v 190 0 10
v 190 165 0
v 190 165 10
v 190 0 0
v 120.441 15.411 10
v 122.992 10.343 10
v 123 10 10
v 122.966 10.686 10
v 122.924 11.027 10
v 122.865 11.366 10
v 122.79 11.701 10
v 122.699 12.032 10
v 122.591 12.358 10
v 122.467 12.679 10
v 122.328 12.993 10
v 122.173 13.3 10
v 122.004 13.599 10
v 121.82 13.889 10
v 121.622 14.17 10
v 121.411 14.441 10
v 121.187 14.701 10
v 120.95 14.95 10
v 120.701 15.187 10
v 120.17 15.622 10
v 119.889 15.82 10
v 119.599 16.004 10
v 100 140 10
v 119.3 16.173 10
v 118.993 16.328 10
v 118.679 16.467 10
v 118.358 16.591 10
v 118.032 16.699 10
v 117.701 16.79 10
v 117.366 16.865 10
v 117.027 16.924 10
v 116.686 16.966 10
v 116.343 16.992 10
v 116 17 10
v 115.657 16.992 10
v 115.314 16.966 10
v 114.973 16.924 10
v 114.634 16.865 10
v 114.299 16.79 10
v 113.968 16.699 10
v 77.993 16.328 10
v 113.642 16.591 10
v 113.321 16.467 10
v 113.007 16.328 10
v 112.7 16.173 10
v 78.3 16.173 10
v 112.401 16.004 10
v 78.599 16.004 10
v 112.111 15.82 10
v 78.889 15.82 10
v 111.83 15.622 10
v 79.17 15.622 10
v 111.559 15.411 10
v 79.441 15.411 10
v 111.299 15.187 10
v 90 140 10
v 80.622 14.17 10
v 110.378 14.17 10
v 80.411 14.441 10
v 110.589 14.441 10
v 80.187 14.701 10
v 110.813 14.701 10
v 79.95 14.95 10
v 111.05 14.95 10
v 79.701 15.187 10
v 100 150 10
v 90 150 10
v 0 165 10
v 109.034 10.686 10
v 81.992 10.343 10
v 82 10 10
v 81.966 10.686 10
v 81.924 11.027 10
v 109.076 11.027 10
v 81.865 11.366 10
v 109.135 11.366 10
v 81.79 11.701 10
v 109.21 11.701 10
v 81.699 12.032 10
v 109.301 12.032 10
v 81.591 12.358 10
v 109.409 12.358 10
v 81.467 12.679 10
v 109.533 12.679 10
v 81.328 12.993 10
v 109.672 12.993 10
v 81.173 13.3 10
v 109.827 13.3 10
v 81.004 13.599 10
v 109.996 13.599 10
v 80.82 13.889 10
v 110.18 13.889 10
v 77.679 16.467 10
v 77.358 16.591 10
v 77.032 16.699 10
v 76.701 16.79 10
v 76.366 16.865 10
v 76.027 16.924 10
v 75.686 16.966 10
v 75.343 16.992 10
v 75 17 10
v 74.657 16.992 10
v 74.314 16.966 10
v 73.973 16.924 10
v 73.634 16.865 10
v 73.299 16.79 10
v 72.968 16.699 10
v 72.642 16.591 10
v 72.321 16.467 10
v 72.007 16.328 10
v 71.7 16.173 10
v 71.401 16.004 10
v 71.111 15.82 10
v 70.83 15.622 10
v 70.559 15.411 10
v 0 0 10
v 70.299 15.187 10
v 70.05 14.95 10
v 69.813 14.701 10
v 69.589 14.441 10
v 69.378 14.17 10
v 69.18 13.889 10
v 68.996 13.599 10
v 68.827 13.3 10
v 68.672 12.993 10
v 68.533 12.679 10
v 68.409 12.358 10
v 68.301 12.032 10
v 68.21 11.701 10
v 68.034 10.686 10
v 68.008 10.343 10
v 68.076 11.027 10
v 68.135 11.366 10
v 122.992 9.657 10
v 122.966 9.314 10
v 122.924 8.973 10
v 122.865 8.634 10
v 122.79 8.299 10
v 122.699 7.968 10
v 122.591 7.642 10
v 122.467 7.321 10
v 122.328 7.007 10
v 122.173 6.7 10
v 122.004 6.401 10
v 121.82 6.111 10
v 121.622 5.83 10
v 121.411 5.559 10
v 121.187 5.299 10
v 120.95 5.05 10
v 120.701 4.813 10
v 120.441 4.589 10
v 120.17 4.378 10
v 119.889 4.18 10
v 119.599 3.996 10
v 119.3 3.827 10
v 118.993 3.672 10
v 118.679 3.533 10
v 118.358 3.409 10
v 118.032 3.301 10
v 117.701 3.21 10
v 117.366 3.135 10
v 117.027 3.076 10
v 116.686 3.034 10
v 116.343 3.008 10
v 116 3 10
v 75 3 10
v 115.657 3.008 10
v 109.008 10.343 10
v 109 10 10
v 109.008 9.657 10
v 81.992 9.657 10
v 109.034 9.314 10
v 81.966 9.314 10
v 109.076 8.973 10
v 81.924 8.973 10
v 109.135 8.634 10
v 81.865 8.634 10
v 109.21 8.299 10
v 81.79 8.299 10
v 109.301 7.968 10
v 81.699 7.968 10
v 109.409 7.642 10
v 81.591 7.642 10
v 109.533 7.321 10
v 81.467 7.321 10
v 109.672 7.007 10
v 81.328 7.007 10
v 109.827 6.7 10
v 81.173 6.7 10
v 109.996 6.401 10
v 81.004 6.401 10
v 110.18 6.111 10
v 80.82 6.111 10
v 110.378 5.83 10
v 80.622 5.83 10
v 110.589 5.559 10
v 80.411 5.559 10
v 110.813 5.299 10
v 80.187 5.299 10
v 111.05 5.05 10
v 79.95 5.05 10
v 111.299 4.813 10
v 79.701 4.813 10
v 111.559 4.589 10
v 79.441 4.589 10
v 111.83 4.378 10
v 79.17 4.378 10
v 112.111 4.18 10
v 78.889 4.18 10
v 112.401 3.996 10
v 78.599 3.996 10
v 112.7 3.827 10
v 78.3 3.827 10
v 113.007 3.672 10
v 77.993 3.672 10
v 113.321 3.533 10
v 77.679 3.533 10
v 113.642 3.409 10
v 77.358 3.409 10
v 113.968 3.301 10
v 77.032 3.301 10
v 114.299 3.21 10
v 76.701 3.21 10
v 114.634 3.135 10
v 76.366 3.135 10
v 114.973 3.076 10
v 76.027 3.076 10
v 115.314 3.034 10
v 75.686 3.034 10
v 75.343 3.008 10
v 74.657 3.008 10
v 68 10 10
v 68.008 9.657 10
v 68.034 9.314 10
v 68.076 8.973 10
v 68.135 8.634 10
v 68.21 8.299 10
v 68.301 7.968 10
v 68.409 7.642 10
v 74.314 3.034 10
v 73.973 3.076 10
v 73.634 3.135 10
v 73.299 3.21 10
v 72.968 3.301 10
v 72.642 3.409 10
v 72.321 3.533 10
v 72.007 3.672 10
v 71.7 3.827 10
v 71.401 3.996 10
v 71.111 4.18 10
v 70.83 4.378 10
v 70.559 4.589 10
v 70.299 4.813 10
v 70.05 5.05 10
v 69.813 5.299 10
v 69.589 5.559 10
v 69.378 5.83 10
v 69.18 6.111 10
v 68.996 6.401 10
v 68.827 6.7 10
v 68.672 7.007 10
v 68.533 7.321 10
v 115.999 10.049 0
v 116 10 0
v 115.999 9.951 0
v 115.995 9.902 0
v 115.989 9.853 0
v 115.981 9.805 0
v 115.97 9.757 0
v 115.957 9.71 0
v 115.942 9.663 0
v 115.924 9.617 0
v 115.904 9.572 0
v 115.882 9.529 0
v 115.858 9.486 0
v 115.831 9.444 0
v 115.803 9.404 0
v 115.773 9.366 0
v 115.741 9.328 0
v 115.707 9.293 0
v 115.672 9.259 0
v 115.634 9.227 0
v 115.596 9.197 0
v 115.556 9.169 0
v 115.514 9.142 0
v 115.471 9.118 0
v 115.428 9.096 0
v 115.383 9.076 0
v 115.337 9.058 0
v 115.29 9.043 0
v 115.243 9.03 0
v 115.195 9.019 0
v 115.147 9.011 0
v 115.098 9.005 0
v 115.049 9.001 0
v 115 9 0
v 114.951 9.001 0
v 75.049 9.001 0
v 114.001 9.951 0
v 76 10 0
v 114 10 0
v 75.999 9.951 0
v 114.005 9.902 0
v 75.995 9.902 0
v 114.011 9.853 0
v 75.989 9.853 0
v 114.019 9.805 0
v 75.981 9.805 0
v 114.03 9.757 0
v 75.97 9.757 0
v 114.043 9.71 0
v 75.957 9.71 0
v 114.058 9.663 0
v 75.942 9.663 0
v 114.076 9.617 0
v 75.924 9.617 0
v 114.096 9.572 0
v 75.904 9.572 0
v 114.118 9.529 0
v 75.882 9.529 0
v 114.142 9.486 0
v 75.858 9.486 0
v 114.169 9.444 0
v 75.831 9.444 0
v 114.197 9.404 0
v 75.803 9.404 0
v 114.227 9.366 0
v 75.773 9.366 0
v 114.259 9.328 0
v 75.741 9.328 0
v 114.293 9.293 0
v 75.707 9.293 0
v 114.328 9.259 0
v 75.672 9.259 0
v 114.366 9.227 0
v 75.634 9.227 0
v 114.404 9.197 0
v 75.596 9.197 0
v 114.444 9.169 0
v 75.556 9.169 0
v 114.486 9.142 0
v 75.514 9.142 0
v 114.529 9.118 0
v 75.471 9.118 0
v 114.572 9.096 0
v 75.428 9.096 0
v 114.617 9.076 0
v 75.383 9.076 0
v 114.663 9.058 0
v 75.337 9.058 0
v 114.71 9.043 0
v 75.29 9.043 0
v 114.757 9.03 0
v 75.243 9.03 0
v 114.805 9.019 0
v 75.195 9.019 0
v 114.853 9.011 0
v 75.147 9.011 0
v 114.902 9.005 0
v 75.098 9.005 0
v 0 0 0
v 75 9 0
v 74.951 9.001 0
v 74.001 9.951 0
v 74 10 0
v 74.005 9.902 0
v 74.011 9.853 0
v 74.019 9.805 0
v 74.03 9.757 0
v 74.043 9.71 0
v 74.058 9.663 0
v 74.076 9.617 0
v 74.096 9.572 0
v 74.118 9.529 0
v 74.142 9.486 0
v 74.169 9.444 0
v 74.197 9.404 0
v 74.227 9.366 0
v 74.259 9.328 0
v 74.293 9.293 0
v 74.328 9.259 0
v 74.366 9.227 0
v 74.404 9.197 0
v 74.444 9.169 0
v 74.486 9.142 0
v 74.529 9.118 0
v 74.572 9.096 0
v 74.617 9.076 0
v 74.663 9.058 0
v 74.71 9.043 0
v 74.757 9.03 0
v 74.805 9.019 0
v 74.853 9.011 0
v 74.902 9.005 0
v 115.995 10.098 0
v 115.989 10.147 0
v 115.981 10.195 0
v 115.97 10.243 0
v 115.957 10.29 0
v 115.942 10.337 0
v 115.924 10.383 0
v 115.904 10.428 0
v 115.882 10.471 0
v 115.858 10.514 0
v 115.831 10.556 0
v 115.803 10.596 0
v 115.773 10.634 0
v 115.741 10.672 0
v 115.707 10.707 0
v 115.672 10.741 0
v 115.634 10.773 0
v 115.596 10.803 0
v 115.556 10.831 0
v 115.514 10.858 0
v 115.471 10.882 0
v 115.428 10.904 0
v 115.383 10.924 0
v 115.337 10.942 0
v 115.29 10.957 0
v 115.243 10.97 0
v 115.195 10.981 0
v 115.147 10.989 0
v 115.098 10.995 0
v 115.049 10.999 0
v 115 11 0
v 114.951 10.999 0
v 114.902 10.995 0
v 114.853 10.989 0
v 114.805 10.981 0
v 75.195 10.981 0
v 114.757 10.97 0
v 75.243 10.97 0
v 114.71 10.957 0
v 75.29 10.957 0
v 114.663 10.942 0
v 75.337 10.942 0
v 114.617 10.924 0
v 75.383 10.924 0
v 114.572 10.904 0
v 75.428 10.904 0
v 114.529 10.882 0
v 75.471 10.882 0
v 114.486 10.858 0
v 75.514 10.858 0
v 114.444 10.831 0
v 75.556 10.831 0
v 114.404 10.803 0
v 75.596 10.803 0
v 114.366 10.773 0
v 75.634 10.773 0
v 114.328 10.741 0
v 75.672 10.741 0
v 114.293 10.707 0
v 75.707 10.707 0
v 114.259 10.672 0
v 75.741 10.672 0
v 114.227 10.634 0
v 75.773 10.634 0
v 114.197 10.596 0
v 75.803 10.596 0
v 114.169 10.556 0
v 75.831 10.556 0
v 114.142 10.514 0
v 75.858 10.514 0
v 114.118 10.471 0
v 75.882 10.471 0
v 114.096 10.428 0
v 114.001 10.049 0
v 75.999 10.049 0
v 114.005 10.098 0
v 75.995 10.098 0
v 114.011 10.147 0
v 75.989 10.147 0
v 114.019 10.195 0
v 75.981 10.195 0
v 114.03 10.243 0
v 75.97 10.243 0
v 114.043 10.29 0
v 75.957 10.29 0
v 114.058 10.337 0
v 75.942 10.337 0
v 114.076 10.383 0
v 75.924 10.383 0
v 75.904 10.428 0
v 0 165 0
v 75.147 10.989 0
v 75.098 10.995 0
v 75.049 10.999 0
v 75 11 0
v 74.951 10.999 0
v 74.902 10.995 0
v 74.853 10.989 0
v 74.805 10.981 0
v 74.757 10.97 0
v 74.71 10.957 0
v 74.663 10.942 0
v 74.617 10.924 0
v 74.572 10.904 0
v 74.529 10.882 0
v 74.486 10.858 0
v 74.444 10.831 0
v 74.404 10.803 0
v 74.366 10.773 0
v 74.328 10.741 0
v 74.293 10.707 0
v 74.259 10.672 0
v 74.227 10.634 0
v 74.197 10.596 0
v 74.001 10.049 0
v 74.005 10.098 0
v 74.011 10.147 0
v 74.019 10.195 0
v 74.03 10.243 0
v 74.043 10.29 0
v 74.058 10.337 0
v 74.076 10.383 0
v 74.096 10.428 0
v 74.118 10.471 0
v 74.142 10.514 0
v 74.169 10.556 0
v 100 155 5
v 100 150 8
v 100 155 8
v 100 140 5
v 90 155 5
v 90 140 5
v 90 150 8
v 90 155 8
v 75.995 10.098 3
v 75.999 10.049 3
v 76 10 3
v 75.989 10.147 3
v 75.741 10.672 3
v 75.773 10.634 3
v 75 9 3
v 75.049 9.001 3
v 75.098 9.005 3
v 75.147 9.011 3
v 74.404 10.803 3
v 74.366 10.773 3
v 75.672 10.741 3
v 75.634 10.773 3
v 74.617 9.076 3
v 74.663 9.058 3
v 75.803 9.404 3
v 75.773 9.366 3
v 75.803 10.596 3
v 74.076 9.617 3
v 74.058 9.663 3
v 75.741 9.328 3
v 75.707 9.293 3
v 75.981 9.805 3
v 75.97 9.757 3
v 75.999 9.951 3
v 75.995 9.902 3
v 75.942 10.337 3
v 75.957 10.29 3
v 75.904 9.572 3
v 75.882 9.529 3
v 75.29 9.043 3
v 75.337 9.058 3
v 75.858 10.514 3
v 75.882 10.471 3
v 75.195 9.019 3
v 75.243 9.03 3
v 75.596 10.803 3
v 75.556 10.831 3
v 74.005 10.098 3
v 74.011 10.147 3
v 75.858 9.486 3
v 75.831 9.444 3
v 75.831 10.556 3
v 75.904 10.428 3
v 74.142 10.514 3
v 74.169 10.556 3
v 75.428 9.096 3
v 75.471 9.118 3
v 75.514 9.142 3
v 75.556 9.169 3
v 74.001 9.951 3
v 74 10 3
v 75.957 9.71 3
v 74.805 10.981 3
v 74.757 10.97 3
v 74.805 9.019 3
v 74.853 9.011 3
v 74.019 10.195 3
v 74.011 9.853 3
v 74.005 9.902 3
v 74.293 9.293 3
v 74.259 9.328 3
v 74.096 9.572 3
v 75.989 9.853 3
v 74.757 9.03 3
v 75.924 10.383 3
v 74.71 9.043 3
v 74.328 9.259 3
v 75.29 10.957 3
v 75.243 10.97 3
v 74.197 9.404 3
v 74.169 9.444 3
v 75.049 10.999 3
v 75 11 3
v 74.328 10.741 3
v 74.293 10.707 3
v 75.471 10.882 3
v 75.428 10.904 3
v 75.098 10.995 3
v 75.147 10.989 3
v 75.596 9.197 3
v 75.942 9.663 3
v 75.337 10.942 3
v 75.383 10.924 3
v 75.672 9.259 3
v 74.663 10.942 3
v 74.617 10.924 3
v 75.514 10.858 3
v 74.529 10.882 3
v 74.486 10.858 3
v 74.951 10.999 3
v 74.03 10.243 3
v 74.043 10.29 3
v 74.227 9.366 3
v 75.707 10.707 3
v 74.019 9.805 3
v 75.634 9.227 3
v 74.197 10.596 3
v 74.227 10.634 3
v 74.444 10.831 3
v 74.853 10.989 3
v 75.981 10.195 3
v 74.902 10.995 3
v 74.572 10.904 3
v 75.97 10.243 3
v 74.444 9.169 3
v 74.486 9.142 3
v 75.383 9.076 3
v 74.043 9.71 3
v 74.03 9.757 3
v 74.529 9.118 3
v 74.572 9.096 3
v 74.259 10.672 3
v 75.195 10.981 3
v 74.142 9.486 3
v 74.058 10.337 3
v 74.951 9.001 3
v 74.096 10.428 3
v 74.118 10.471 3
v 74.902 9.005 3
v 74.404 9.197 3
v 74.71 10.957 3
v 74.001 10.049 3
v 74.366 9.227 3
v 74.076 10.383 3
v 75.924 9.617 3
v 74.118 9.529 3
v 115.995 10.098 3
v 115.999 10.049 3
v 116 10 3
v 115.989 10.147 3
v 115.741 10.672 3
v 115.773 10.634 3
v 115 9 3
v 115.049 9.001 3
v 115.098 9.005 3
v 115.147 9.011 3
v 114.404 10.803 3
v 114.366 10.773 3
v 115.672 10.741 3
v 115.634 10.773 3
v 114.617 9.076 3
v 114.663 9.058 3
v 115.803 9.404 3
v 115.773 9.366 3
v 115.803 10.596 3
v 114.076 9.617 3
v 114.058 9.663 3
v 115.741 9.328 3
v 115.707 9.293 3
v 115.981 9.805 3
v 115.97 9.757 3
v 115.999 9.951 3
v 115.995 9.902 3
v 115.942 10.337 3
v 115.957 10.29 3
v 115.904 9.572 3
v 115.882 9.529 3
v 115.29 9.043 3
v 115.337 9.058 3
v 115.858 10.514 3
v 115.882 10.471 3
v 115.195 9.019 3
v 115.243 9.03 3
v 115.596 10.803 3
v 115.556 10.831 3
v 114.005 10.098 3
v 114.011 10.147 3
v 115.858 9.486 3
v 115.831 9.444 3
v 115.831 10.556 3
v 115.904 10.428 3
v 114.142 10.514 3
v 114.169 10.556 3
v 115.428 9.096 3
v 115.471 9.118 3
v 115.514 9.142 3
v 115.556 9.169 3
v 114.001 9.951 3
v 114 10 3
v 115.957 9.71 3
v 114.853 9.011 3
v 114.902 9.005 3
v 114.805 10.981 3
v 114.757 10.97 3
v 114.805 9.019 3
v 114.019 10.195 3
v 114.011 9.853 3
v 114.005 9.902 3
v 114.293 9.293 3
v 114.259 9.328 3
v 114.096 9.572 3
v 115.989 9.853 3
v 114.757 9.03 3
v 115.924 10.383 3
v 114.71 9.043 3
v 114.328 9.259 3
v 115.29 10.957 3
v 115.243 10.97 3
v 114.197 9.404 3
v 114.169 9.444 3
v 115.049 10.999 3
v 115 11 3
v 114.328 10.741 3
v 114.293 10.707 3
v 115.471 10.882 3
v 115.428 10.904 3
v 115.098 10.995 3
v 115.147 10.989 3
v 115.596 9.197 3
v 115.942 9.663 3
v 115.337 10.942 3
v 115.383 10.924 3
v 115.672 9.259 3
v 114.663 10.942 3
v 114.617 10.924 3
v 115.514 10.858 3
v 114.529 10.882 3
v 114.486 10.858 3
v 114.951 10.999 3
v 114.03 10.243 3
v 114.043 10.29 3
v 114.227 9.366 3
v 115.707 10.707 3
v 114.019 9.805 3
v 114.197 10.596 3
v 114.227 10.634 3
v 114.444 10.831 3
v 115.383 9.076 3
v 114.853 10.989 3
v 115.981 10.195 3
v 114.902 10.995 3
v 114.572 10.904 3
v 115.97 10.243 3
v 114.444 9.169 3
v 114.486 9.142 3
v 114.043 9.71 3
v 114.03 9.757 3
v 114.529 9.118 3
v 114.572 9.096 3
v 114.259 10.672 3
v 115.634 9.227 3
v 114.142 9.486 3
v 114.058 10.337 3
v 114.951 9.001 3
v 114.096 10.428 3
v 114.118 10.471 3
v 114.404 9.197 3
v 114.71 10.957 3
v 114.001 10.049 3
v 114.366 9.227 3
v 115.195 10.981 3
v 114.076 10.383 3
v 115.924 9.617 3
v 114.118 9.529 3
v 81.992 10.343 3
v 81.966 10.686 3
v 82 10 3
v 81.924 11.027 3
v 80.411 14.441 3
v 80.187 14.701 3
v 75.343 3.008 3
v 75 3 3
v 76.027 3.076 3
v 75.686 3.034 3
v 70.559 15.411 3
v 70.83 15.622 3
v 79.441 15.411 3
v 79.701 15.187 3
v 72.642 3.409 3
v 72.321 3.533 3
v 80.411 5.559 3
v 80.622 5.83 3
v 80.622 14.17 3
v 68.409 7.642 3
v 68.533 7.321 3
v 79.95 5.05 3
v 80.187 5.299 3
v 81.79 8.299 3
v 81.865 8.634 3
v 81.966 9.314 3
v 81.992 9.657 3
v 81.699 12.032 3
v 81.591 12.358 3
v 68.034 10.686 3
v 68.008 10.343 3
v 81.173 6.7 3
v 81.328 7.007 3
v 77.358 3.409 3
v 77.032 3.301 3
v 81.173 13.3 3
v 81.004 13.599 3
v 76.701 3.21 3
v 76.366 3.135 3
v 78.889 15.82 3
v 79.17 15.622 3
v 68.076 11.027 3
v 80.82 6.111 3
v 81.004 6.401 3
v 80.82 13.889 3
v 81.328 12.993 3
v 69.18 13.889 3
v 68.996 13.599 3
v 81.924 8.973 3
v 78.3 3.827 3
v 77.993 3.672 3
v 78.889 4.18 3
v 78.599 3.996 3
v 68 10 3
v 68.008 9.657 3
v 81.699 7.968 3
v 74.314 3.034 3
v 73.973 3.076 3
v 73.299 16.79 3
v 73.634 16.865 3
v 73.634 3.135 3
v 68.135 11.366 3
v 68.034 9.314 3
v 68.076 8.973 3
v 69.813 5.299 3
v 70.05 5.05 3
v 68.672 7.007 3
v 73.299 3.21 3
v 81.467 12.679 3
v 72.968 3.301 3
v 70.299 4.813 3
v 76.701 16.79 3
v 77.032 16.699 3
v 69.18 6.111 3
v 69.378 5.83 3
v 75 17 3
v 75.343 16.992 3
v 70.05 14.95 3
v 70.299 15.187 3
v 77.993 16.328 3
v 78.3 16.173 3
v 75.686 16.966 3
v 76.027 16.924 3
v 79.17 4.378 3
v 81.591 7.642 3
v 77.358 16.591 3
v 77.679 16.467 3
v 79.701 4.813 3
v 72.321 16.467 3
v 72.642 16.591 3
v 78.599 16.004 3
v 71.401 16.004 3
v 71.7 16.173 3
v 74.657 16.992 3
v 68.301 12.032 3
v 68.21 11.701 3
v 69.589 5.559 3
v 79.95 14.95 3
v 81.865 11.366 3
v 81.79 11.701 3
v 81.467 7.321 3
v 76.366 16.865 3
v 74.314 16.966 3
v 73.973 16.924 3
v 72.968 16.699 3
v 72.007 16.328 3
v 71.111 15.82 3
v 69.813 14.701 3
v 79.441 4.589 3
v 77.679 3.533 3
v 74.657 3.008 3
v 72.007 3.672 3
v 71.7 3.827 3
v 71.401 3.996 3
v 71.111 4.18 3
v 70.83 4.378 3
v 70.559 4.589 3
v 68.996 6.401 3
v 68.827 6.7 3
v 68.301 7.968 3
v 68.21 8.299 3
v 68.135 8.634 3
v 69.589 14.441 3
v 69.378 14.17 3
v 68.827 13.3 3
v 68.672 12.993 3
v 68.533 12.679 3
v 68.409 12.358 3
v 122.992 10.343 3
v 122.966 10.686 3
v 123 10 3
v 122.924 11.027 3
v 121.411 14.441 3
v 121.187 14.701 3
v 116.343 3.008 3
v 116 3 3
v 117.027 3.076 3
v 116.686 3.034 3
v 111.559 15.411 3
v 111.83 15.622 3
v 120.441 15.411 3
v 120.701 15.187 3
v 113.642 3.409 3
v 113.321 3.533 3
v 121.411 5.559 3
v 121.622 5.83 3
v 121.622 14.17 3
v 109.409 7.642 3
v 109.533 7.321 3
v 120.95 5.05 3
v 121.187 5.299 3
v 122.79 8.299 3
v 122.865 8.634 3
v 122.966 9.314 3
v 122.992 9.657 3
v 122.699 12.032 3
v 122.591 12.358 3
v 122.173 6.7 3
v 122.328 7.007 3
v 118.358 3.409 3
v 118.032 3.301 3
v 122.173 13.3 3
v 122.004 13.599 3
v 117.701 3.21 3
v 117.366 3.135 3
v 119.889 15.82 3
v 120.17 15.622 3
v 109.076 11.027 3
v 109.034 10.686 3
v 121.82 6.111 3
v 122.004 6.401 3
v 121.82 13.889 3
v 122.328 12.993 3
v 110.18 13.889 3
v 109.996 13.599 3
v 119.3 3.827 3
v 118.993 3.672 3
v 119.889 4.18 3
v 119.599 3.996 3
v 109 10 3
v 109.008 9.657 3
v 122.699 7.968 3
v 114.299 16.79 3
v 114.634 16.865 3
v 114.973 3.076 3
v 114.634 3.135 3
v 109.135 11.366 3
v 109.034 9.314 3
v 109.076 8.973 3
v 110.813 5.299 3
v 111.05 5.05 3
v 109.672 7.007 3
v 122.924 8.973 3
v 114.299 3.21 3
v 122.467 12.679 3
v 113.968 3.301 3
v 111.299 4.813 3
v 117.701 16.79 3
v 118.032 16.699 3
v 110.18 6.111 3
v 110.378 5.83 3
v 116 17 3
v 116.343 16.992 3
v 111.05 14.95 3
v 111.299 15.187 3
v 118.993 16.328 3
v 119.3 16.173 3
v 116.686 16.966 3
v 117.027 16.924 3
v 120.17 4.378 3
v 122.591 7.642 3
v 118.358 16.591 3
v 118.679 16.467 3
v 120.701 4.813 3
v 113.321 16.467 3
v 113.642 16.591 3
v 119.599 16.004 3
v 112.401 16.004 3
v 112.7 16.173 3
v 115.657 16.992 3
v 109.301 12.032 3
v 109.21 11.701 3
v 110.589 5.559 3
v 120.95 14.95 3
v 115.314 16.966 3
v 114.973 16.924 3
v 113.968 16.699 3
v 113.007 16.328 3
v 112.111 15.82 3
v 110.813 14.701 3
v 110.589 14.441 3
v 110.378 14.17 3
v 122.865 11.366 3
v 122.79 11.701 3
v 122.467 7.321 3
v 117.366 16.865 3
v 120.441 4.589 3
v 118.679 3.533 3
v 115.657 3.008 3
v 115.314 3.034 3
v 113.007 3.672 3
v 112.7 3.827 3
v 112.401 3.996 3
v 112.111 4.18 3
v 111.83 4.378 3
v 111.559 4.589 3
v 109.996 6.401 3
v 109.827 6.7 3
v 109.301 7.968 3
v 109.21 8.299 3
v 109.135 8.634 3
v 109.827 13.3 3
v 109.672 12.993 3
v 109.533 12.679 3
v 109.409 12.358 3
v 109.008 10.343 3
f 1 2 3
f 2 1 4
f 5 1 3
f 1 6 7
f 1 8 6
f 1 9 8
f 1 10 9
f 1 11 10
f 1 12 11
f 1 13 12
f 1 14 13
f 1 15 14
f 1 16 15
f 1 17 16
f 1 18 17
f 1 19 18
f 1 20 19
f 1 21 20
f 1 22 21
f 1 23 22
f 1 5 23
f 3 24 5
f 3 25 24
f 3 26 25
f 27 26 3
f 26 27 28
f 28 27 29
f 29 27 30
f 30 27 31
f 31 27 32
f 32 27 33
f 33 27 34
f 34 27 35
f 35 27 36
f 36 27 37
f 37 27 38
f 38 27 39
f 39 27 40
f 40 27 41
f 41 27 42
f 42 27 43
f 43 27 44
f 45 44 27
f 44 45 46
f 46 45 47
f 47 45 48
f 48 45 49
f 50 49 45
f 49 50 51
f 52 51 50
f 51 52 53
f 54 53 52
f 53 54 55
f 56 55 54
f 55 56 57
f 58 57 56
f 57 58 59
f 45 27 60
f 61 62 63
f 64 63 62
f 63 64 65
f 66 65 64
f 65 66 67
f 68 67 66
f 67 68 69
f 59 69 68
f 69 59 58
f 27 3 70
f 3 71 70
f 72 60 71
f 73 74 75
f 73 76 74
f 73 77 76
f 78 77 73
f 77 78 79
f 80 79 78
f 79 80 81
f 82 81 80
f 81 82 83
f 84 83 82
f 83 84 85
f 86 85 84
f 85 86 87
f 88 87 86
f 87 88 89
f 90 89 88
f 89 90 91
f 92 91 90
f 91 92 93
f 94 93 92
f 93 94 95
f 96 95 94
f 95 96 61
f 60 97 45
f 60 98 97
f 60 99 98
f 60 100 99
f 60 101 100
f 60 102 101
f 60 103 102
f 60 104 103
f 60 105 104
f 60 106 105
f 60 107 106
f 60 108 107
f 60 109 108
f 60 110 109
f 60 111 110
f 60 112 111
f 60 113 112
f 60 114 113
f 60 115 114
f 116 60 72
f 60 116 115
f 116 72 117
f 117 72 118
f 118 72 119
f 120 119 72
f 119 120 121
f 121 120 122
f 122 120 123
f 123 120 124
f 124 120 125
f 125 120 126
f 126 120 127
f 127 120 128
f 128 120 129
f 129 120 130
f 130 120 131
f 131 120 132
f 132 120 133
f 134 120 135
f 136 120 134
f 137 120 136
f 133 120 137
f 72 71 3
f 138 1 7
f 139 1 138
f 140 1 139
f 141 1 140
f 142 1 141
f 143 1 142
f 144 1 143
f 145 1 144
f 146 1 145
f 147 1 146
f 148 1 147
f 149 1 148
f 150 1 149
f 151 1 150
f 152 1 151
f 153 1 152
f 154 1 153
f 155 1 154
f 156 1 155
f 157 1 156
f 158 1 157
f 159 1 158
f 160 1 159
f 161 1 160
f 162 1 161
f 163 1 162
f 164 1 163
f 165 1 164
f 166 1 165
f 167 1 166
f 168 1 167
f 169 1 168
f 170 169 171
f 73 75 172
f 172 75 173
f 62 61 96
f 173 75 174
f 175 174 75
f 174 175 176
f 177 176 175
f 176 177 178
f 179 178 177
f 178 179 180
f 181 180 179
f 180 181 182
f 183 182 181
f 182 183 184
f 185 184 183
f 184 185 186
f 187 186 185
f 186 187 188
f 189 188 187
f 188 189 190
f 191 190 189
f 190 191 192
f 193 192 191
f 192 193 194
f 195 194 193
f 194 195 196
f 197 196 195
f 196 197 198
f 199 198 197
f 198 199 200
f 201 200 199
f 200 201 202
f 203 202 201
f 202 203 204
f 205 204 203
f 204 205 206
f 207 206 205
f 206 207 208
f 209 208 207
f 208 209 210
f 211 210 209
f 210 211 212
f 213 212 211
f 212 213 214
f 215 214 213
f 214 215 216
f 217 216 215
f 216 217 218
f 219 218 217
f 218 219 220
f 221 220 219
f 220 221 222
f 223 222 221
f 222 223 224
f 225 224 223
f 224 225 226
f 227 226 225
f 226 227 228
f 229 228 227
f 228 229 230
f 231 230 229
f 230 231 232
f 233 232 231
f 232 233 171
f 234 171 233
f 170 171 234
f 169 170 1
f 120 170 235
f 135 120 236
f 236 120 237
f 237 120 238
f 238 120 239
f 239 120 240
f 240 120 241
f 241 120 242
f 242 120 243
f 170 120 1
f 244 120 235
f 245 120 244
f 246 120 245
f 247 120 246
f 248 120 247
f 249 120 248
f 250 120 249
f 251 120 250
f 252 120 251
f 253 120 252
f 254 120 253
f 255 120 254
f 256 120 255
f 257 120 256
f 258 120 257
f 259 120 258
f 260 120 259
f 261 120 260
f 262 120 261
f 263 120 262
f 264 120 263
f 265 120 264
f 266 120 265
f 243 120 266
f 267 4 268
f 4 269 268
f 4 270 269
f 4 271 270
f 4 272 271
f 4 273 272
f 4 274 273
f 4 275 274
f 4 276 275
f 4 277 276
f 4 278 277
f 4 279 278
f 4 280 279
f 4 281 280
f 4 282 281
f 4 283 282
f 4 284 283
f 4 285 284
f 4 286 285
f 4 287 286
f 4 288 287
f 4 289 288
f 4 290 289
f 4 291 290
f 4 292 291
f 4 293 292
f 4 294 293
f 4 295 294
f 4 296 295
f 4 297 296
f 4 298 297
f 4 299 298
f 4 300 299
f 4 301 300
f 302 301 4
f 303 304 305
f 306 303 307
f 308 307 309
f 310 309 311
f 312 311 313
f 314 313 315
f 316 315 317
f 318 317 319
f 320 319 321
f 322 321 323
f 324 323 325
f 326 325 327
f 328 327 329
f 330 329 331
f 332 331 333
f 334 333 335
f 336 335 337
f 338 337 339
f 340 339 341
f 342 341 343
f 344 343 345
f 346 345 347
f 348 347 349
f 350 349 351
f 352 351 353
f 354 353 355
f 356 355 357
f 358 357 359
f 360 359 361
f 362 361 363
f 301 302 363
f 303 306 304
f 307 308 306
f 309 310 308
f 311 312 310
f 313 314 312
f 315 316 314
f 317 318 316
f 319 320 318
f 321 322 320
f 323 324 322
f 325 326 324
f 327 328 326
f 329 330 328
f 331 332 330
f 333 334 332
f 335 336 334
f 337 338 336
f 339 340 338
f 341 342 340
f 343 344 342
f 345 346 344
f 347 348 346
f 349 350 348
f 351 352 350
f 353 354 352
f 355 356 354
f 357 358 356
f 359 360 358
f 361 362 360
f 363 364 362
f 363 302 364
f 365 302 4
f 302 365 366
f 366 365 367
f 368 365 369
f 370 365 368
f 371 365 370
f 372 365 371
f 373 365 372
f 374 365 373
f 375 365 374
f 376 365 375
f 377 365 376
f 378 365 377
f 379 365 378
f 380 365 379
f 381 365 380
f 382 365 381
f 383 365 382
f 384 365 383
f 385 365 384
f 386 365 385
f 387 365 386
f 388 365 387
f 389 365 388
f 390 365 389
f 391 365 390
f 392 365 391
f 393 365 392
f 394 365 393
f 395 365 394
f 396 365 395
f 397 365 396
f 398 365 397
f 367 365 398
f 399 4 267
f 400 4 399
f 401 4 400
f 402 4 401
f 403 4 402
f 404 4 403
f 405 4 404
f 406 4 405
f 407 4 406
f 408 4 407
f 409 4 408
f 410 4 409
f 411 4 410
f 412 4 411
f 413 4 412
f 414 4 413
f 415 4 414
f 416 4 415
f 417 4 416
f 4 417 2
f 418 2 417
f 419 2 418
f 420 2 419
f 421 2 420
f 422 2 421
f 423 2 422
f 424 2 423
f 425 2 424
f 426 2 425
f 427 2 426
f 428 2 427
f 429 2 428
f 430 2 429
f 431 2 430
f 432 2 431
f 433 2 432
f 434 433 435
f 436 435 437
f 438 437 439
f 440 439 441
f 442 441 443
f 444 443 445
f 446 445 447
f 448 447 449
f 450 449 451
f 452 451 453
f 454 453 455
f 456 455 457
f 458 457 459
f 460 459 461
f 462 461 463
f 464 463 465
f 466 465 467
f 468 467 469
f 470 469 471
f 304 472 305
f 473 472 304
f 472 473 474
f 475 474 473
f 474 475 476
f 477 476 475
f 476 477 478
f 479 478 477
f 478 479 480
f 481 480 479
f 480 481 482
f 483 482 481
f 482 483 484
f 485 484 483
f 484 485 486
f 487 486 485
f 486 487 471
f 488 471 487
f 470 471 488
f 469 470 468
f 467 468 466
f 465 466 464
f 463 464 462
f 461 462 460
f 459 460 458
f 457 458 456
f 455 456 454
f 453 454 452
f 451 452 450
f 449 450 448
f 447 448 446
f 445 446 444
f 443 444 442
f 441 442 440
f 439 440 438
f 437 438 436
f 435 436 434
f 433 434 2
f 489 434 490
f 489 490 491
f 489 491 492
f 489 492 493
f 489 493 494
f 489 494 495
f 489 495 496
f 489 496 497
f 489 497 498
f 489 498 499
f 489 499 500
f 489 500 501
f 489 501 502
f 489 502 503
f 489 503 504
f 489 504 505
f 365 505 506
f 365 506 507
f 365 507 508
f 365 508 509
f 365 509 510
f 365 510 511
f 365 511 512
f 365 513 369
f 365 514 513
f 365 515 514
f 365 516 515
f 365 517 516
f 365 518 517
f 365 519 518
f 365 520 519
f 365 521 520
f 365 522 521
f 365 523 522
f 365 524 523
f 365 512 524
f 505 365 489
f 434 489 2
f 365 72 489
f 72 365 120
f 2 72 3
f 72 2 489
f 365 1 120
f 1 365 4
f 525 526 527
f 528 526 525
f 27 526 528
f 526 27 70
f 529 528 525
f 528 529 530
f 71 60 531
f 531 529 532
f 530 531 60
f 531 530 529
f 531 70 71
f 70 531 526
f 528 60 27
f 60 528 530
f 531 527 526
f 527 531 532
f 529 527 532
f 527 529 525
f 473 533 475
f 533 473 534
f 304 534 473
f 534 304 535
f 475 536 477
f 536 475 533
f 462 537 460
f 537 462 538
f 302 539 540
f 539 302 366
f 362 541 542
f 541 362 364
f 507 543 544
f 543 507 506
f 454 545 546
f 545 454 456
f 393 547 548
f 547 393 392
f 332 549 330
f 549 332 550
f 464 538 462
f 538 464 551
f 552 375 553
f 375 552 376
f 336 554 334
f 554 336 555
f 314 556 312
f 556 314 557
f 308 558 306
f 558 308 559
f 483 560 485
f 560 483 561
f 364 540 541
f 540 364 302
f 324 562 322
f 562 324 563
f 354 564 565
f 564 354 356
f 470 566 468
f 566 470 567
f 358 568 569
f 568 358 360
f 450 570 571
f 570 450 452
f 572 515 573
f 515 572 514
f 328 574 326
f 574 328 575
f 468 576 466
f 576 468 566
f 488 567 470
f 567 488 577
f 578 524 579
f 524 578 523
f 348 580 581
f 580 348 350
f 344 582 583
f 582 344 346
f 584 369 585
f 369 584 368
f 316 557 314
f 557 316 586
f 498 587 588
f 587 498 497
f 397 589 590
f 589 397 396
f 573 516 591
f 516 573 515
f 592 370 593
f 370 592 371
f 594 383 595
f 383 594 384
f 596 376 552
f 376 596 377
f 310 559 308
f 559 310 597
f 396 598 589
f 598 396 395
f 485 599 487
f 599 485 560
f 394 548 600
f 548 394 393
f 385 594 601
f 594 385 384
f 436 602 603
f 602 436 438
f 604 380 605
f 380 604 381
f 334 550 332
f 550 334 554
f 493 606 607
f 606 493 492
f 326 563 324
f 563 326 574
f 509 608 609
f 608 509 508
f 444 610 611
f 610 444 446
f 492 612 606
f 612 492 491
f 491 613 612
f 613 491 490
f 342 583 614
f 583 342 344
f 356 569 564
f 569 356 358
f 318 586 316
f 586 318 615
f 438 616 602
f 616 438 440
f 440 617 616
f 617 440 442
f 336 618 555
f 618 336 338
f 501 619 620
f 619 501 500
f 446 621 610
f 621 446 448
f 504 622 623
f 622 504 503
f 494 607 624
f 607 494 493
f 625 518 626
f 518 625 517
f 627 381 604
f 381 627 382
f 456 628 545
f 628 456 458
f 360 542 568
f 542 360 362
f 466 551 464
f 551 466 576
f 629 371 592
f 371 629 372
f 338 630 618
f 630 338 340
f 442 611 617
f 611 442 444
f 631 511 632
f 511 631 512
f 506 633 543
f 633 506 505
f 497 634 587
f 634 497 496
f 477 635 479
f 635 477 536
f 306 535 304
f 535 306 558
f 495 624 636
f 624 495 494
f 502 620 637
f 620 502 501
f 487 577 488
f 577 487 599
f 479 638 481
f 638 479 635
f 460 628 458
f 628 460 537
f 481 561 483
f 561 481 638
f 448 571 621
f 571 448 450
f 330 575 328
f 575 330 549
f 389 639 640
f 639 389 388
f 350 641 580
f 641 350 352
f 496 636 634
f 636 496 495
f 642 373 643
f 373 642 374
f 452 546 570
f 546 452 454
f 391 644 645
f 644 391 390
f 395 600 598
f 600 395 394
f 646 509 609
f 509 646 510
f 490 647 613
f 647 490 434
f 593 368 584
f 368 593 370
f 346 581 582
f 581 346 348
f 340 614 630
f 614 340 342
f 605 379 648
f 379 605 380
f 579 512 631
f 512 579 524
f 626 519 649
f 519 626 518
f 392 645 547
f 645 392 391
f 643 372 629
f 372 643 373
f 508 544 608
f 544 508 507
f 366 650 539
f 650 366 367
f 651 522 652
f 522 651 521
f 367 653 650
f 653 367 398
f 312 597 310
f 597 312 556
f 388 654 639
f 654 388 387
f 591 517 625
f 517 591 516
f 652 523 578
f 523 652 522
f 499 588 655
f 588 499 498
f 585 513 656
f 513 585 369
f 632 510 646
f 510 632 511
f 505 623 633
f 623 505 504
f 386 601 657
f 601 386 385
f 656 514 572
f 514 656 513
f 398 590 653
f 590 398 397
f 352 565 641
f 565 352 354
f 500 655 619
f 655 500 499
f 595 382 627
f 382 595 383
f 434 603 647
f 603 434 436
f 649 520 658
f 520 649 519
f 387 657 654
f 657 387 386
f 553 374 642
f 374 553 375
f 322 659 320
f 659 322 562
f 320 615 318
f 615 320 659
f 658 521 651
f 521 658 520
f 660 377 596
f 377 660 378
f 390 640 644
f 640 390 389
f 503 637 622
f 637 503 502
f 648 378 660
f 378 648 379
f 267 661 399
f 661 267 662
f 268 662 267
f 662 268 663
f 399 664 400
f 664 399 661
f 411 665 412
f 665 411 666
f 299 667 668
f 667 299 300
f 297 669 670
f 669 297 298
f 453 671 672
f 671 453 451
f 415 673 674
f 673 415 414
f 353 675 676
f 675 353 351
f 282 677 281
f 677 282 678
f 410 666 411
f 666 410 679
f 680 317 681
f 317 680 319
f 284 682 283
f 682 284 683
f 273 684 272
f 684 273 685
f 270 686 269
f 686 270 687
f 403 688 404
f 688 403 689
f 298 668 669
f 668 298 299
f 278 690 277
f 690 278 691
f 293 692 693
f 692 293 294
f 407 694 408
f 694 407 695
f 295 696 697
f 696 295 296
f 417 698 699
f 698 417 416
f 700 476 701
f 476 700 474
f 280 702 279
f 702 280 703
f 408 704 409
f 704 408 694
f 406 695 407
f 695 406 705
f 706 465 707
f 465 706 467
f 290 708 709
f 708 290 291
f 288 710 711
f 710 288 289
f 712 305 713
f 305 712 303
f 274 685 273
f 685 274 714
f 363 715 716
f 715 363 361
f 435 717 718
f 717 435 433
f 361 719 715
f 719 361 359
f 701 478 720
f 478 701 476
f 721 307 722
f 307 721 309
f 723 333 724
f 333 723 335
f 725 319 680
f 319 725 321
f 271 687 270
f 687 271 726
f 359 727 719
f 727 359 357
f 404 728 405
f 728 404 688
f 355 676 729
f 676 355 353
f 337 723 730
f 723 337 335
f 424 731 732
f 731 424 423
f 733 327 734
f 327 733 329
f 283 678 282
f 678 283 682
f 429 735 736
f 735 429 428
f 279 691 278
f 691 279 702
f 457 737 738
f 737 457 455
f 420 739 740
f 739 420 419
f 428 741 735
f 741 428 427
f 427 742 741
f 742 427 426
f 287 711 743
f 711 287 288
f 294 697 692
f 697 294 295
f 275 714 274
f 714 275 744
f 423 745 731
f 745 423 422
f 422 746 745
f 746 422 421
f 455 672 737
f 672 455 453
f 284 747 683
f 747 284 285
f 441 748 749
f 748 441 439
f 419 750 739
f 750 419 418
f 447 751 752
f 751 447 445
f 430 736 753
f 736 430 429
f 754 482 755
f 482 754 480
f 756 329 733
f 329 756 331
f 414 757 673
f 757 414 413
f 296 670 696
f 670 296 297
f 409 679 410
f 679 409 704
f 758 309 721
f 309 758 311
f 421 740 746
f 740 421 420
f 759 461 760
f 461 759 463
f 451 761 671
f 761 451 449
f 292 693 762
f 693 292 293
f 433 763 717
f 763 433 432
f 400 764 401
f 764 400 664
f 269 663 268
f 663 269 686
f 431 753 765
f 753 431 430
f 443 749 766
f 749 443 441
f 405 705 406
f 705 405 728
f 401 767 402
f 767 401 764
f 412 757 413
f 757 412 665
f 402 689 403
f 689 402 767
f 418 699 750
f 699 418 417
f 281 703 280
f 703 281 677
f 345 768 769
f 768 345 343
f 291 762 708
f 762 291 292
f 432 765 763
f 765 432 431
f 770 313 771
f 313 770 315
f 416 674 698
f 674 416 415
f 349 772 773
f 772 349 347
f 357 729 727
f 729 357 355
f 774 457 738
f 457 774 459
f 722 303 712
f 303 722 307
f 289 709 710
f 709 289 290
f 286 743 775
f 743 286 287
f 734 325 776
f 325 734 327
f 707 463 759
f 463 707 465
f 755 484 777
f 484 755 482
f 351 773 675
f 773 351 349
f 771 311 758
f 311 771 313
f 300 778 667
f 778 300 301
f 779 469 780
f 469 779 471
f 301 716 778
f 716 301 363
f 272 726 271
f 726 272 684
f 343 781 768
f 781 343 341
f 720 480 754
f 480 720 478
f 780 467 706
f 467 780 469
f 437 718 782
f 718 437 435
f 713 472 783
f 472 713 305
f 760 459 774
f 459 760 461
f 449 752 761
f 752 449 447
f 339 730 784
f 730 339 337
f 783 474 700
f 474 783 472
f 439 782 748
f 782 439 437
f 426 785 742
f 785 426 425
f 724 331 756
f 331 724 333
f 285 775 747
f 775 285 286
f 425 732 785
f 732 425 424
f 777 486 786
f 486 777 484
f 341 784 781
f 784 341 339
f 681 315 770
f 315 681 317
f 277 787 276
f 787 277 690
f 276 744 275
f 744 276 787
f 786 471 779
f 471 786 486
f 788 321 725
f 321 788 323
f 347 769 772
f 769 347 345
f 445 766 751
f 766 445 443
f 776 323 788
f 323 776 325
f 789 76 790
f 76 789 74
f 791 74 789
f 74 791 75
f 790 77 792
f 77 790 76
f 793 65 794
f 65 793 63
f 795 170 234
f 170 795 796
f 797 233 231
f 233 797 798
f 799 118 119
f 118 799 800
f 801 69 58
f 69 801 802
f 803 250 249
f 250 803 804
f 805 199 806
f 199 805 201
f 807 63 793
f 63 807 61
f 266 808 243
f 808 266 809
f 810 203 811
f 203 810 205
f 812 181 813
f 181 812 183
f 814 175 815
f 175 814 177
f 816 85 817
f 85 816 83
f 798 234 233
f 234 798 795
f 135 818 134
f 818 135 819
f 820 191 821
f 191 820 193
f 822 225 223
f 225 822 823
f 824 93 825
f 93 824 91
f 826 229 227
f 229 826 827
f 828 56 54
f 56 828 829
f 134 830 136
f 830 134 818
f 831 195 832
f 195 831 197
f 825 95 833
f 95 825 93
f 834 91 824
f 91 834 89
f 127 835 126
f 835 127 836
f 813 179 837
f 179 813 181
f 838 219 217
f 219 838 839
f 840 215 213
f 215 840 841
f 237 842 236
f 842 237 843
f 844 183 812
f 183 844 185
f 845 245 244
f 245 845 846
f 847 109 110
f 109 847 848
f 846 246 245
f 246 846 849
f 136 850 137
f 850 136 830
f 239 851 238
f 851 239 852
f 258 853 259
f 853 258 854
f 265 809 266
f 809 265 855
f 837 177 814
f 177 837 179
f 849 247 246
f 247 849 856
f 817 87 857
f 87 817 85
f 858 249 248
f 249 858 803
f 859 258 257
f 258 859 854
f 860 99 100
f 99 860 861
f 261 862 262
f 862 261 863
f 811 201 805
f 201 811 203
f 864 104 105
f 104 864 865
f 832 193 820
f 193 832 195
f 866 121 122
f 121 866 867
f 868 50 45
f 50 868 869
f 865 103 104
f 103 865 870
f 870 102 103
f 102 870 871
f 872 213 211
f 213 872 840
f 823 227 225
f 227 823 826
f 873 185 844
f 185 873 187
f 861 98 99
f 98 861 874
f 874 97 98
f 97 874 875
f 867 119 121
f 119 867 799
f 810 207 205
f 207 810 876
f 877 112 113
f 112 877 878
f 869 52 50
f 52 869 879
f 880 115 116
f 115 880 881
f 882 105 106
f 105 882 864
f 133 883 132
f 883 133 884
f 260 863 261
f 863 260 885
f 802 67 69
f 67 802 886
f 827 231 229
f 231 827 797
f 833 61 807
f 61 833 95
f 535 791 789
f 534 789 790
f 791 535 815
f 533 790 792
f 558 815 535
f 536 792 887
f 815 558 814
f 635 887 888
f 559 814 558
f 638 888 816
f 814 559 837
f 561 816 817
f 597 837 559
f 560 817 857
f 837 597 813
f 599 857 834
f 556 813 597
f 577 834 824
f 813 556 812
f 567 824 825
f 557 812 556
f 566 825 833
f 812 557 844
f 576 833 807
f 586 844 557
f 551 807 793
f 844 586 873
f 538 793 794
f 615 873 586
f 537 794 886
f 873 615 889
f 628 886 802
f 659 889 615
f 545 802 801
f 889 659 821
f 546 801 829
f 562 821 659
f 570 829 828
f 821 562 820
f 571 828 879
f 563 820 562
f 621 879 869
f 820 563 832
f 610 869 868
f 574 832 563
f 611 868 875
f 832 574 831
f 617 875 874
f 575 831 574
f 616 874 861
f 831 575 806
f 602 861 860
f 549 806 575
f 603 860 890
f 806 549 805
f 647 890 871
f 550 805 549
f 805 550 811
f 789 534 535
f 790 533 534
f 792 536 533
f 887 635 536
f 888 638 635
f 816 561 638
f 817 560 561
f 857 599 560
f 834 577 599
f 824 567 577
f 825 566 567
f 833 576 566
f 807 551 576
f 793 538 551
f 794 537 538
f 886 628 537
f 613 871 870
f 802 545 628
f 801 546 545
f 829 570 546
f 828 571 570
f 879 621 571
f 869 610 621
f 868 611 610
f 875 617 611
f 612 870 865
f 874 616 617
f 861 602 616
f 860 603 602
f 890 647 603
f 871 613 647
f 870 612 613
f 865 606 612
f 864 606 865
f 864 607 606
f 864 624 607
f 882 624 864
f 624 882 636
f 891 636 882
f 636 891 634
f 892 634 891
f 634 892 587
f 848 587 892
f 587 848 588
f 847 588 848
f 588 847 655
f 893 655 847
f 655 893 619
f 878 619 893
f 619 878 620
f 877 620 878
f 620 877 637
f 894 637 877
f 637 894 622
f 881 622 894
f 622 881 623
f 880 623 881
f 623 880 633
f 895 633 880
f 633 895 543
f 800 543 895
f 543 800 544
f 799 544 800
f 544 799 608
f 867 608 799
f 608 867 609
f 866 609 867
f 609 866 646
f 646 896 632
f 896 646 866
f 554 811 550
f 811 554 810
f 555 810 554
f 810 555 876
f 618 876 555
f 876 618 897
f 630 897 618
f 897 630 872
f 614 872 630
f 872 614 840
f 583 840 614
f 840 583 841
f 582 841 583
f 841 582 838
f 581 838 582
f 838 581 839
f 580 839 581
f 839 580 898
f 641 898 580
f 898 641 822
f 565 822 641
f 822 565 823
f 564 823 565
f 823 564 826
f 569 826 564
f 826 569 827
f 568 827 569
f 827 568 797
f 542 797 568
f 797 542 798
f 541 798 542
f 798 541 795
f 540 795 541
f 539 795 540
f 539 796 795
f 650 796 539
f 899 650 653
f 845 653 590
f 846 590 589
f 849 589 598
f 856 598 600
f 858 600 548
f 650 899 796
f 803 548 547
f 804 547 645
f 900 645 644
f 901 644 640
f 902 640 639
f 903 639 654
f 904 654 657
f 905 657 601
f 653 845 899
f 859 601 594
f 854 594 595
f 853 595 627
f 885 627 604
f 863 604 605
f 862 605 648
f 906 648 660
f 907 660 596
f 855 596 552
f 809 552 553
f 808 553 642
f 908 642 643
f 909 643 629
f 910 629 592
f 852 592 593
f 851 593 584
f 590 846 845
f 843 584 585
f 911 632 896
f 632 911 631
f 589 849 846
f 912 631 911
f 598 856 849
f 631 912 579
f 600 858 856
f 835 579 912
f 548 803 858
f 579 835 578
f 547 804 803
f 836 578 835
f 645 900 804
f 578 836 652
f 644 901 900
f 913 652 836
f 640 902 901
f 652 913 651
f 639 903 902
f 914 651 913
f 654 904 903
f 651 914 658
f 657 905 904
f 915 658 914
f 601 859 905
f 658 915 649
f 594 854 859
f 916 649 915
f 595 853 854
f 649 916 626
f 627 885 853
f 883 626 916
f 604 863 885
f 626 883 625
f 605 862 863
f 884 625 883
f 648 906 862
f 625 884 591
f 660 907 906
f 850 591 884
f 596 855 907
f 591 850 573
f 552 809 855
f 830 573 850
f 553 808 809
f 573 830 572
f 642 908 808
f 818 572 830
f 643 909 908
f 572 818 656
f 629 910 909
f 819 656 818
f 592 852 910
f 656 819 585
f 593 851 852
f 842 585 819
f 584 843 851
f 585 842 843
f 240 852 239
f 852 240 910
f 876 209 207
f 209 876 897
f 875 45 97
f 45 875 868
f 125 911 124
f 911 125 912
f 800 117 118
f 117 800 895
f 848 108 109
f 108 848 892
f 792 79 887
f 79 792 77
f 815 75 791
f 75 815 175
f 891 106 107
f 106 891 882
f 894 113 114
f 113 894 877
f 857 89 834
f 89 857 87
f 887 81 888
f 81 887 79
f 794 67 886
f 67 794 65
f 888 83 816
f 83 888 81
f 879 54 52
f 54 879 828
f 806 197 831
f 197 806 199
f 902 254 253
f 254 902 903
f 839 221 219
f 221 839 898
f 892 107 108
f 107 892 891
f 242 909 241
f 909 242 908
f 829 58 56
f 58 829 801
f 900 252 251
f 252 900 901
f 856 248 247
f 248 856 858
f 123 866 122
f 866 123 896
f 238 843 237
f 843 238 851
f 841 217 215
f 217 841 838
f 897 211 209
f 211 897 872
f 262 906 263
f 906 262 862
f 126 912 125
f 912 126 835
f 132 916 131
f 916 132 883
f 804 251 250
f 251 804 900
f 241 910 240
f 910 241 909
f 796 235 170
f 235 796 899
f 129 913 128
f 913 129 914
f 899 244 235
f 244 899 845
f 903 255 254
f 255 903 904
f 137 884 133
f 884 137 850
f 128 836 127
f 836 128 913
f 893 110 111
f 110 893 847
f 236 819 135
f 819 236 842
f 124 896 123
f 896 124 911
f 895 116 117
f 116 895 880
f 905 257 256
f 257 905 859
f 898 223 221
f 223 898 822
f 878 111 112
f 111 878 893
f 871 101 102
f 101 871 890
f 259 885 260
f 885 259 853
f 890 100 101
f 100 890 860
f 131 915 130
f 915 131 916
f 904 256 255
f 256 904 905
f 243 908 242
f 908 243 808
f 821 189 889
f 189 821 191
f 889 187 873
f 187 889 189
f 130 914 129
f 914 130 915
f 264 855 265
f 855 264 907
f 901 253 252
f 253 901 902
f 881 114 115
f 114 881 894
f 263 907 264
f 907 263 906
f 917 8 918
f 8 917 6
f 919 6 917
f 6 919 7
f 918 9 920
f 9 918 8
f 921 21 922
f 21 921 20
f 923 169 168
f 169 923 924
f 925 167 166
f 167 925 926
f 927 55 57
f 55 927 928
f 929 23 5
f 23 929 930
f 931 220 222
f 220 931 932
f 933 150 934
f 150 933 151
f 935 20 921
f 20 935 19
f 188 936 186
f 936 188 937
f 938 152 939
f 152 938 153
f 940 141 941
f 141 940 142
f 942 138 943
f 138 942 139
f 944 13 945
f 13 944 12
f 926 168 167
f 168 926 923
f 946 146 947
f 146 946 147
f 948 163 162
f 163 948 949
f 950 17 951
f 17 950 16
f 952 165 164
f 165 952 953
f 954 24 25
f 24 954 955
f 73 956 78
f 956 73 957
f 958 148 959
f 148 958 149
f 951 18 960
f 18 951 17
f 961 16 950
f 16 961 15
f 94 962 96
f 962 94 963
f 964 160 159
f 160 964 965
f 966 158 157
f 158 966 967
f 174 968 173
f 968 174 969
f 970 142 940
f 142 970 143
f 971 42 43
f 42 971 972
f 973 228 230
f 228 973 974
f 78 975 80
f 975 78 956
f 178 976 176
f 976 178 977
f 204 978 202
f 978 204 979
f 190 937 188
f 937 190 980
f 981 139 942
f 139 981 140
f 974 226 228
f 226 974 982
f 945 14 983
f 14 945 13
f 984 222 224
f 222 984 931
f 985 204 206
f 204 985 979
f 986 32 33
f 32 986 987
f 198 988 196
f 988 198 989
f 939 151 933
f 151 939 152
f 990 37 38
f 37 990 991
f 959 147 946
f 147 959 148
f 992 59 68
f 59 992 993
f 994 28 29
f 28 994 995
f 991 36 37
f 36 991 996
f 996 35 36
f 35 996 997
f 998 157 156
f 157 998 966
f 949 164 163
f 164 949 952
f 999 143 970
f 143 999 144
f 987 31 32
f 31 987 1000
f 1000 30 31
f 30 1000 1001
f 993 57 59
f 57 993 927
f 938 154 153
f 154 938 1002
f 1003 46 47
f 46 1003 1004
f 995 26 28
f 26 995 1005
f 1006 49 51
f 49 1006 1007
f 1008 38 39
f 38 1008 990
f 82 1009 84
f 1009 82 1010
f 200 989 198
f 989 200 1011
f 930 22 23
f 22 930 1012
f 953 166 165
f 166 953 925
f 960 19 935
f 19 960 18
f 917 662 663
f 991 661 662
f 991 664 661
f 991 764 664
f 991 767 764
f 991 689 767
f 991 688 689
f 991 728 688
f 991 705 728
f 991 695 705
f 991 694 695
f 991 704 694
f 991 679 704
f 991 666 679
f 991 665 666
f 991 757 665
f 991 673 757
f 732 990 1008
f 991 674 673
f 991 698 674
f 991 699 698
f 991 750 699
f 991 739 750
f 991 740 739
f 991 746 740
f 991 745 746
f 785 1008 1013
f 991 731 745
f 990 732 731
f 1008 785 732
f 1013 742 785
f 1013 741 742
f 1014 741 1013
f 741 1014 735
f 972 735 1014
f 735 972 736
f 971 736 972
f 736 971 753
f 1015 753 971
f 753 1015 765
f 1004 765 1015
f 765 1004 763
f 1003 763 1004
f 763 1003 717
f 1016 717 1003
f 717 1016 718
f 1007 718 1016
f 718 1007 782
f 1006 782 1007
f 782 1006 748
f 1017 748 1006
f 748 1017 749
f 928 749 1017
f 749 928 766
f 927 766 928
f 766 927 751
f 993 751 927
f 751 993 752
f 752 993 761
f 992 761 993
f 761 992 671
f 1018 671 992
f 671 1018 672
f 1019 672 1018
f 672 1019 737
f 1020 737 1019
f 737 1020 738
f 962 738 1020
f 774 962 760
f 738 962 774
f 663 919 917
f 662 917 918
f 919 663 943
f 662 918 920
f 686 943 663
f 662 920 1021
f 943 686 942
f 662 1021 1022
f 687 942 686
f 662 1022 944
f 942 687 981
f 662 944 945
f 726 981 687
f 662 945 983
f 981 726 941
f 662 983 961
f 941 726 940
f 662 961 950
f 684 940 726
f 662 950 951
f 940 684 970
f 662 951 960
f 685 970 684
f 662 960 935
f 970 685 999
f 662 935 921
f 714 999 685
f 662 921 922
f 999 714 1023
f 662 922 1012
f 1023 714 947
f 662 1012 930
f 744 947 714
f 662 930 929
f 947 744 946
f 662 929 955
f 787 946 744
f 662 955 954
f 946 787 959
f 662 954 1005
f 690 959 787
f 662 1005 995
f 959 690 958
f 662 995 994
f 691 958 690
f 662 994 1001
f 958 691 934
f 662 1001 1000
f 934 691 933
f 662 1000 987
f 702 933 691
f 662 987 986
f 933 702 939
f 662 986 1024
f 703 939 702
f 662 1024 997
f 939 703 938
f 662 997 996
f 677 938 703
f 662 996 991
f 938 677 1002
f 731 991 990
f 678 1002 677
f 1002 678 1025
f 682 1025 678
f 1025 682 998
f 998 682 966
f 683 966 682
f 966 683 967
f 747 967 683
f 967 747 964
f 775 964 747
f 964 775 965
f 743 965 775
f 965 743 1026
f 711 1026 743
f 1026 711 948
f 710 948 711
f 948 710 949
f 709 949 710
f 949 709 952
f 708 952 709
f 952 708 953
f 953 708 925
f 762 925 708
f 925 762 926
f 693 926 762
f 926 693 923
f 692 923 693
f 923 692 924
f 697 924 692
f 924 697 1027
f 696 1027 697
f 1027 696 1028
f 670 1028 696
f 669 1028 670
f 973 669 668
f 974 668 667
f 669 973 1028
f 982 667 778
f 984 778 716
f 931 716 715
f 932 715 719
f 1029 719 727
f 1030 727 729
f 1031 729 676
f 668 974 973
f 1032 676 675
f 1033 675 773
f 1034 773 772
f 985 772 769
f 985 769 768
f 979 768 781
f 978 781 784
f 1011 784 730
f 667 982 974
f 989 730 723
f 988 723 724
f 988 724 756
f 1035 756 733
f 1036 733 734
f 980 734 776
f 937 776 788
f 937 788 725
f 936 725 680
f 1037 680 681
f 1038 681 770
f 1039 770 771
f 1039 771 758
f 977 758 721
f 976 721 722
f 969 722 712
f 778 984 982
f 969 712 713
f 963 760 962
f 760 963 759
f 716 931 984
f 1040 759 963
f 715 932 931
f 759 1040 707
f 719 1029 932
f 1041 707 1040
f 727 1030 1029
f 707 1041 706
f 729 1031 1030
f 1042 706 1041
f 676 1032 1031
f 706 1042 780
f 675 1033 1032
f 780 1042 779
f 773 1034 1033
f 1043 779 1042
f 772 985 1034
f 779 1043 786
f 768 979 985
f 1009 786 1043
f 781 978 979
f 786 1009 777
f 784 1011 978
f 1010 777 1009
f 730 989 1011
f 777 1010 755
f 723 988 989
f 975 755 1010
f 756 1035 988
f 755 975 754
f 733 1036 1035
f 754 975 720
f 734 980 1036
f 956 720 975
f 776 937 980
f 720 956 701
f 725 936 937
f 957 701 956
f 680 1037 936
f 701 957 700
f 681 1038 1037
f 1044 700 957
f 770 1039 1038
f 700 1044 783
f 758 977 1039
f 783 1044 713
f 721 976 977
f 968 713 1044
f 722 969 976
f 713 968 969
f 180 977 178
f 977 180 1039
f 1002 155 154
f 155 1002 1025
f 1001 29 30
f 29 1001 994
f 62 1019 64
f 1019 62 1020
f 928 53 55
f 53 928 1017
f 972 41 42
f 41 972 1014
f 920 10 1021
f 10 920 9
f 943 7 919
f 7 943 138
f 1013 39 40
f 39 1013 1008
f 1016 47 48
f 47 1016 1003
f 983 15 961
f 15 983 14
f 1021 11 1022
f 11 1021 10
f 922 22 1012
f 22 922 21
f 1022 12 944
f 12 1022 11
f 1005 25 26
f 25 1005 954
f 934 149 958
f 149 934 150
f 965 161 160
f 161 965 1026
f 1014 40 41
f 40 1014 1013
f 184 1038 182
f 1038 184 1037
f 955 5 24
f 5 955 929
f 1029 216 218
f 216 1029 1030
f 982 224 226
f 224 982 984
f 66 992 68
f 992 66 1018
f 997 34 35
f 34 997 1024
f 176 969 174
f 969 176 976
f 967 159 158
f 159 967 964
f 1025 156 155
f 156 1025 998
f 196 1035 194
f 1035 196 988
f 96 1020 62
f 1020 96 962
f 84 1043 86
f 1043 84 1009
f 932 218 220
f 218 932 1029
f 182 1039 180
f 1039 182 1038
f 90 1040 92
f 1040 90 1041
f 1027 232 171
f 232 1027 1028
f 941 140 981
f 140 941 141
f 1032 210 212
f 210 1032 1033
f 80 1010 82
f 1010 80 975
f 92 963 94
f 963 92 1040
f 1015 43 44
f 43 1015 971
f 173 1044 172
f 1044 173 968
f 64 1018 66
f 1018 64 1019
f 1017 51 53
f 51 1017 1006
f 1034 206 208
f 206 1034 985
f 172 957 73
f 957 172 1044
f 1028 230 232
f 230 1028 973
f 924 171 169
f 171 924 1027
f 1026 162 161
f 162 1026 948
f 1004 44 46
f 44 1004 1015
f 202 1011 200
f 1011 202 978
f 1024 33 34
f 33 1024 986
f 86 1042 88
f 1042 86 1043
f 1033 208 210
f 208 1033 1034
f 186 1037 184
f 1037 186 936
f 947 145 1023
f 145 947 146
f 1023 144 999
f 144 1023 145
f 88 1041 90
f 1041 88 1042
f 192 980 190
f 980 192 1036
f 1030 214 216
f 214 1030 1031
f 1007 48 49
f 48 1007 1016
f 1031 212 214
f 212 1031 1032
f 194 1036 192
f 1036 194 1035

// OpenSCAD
$fn=128;
difference()
{
  cube([190,165,10]);
  translate([90,140,5]) cube([10,10,6]);
  translate([90,140,5]) cube([10,15,3]);
  translate([75,10,-1]) cylinder(h=12,r=1);
  translate([115,10,-1]) cylinder(h=12,r=1);
  translate([75,10,3]) cylinder(h=12,r=7);
  translate([116,10,3]) cylinder(h=12,r=7);
}
